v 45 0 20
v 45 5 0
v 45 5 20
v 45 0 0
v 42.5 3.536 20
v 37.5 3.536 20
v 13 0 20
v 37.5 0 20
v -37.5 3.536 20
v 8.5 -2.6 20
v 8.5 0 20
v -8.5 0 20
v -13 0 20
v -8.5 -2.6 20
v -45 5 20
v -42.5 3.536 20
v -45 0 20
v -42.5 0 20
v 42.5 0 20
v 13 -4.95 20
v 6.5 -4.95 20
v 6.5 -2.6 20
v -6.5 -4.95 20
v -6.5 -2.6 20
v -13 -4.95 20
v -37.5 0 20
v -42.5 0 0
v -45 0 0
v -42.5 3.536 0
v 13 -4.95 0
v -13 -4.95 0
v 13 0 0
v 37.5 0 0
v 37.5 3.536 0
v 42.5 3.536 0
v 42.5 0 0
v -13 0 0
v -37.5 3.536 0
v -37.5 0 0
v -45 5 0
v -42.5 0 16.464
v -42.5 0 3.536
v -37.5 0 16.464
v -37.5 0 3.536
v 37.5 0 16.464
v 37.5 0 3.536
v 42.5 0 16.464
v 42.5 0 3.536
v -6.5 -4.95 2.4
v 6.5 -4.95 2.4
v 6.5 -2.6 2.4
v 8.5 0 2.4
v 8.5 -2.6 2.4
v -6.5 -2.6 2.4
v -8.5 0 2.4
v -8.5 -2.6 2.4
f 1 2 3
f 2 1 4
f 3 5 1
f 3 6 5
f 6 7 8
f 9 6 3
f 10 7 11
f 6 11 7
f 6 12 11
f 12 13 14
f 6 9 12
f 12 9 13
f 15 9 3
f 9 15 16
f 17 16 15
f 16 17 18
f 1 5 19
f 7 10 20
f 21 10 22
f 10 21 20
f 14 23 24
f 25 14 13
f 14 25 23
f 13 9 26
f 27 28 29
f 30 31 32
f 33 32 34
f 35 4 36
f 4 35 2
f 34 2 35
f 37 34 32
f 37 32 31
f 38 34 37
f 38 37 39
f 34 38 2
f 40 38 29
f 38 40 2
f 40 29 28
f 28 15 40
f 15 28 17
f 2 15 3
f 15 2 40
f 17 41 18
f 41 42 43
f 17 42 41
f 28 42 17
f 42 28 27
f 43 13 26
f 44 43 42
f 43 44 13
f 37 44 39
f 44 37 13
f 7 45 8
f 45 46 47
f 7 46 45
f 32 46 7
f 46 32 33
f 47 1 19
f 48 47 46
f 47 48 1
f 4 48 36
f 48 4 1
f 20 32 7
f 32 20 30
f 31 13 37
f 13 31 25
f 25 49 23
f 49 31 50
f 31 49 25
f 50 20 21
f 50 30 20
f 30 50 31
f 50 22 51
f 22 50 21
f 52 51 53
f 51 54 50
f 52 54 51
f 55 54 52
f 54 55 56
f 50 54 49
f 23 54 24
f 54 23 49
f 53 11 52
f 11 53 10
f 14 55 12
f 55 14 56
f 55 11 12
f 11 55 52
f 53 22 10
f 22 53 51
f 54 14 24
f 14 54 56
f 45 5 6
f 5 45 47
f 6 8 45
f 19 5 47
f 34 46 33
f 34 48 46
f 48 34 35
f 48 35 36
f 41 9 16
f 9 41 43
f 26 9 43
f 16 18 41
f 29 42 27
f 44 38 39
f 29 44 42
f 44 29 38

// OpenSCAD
//Mount for a bicycle back light
//Ari M Diacou
//June 2016

/////////////////////// Parameters //////////////////////
base_width=90;
base_height=20;
base_thickness=5;
coupler_width=26;
coupler_height=base_height;
coupler_thickness=5;
stem_width=13;
coupler_head=17;
tolerance=2.4;
ep=0+0.05;
ziptie_width=5;

///////////////////////// Main() /////////////////////////
echo(str("Suggested Filename: Bike Light Mount-B",base_width,"x",base_height,"x",base_thickness,"-C",coupler_width,"x",coupler_thickness,"-S",stem_width,"x",coupler_head,"x",tolerance,"-Z",ziptie_width));
difference(){
    base();
    light_coupler();
    ziptie_cutouts();
    }
//////////////////////// Functions //////////////////////////
module base(){
    translate([-base_width/2,0,0]) 
        cube([base_width,base_thickness,base_height]);
    translate([-coupler_width/2,-base_thickness+ep,0]) 
        cube([coupler_width,coupler_thickness,coupler_height]);
    }

module light_coupler(){    
    //cutout
    //stem
    //color("red") 
        translate([-stem_width/2,-base_thickness-ep,tolerance]) 
            cube([stem_width,base_thickness,coupler_height]);
    //coupler
    translate([-coupler_head/2,-base_thickness+tolerance,tolerance]) 
        //color("blue") 
            cube([coupler_head,coupler_thickness-1*tolerance,coupler_height]);
    }
module ziptie_cutouts(){
    //color("red")
        {
        translate([base_width/2-ziptie_width,0,base_height]) rotate([45,0,0])
            cube([ziptie_width,base_thickness,base_thickness], center=true );
        translate([base_width/2-ziptie_width,0,0]) rotate([45,0,0])
            cube([ziptie_width,base_thickness,base_thickness], center=true );
        translate([-base_width/2+ziptie_width,0,base_height]) rotate([45,0,0])
            cube([ziptie_width,base_thickness,base_thickness], center=true );
        translate([-base_width/2+ziptie_width,0,0]) rotate([45,0,0])
            cube([ziptie_width,base_thickness,base_thickness], center=true );
        }
    }
